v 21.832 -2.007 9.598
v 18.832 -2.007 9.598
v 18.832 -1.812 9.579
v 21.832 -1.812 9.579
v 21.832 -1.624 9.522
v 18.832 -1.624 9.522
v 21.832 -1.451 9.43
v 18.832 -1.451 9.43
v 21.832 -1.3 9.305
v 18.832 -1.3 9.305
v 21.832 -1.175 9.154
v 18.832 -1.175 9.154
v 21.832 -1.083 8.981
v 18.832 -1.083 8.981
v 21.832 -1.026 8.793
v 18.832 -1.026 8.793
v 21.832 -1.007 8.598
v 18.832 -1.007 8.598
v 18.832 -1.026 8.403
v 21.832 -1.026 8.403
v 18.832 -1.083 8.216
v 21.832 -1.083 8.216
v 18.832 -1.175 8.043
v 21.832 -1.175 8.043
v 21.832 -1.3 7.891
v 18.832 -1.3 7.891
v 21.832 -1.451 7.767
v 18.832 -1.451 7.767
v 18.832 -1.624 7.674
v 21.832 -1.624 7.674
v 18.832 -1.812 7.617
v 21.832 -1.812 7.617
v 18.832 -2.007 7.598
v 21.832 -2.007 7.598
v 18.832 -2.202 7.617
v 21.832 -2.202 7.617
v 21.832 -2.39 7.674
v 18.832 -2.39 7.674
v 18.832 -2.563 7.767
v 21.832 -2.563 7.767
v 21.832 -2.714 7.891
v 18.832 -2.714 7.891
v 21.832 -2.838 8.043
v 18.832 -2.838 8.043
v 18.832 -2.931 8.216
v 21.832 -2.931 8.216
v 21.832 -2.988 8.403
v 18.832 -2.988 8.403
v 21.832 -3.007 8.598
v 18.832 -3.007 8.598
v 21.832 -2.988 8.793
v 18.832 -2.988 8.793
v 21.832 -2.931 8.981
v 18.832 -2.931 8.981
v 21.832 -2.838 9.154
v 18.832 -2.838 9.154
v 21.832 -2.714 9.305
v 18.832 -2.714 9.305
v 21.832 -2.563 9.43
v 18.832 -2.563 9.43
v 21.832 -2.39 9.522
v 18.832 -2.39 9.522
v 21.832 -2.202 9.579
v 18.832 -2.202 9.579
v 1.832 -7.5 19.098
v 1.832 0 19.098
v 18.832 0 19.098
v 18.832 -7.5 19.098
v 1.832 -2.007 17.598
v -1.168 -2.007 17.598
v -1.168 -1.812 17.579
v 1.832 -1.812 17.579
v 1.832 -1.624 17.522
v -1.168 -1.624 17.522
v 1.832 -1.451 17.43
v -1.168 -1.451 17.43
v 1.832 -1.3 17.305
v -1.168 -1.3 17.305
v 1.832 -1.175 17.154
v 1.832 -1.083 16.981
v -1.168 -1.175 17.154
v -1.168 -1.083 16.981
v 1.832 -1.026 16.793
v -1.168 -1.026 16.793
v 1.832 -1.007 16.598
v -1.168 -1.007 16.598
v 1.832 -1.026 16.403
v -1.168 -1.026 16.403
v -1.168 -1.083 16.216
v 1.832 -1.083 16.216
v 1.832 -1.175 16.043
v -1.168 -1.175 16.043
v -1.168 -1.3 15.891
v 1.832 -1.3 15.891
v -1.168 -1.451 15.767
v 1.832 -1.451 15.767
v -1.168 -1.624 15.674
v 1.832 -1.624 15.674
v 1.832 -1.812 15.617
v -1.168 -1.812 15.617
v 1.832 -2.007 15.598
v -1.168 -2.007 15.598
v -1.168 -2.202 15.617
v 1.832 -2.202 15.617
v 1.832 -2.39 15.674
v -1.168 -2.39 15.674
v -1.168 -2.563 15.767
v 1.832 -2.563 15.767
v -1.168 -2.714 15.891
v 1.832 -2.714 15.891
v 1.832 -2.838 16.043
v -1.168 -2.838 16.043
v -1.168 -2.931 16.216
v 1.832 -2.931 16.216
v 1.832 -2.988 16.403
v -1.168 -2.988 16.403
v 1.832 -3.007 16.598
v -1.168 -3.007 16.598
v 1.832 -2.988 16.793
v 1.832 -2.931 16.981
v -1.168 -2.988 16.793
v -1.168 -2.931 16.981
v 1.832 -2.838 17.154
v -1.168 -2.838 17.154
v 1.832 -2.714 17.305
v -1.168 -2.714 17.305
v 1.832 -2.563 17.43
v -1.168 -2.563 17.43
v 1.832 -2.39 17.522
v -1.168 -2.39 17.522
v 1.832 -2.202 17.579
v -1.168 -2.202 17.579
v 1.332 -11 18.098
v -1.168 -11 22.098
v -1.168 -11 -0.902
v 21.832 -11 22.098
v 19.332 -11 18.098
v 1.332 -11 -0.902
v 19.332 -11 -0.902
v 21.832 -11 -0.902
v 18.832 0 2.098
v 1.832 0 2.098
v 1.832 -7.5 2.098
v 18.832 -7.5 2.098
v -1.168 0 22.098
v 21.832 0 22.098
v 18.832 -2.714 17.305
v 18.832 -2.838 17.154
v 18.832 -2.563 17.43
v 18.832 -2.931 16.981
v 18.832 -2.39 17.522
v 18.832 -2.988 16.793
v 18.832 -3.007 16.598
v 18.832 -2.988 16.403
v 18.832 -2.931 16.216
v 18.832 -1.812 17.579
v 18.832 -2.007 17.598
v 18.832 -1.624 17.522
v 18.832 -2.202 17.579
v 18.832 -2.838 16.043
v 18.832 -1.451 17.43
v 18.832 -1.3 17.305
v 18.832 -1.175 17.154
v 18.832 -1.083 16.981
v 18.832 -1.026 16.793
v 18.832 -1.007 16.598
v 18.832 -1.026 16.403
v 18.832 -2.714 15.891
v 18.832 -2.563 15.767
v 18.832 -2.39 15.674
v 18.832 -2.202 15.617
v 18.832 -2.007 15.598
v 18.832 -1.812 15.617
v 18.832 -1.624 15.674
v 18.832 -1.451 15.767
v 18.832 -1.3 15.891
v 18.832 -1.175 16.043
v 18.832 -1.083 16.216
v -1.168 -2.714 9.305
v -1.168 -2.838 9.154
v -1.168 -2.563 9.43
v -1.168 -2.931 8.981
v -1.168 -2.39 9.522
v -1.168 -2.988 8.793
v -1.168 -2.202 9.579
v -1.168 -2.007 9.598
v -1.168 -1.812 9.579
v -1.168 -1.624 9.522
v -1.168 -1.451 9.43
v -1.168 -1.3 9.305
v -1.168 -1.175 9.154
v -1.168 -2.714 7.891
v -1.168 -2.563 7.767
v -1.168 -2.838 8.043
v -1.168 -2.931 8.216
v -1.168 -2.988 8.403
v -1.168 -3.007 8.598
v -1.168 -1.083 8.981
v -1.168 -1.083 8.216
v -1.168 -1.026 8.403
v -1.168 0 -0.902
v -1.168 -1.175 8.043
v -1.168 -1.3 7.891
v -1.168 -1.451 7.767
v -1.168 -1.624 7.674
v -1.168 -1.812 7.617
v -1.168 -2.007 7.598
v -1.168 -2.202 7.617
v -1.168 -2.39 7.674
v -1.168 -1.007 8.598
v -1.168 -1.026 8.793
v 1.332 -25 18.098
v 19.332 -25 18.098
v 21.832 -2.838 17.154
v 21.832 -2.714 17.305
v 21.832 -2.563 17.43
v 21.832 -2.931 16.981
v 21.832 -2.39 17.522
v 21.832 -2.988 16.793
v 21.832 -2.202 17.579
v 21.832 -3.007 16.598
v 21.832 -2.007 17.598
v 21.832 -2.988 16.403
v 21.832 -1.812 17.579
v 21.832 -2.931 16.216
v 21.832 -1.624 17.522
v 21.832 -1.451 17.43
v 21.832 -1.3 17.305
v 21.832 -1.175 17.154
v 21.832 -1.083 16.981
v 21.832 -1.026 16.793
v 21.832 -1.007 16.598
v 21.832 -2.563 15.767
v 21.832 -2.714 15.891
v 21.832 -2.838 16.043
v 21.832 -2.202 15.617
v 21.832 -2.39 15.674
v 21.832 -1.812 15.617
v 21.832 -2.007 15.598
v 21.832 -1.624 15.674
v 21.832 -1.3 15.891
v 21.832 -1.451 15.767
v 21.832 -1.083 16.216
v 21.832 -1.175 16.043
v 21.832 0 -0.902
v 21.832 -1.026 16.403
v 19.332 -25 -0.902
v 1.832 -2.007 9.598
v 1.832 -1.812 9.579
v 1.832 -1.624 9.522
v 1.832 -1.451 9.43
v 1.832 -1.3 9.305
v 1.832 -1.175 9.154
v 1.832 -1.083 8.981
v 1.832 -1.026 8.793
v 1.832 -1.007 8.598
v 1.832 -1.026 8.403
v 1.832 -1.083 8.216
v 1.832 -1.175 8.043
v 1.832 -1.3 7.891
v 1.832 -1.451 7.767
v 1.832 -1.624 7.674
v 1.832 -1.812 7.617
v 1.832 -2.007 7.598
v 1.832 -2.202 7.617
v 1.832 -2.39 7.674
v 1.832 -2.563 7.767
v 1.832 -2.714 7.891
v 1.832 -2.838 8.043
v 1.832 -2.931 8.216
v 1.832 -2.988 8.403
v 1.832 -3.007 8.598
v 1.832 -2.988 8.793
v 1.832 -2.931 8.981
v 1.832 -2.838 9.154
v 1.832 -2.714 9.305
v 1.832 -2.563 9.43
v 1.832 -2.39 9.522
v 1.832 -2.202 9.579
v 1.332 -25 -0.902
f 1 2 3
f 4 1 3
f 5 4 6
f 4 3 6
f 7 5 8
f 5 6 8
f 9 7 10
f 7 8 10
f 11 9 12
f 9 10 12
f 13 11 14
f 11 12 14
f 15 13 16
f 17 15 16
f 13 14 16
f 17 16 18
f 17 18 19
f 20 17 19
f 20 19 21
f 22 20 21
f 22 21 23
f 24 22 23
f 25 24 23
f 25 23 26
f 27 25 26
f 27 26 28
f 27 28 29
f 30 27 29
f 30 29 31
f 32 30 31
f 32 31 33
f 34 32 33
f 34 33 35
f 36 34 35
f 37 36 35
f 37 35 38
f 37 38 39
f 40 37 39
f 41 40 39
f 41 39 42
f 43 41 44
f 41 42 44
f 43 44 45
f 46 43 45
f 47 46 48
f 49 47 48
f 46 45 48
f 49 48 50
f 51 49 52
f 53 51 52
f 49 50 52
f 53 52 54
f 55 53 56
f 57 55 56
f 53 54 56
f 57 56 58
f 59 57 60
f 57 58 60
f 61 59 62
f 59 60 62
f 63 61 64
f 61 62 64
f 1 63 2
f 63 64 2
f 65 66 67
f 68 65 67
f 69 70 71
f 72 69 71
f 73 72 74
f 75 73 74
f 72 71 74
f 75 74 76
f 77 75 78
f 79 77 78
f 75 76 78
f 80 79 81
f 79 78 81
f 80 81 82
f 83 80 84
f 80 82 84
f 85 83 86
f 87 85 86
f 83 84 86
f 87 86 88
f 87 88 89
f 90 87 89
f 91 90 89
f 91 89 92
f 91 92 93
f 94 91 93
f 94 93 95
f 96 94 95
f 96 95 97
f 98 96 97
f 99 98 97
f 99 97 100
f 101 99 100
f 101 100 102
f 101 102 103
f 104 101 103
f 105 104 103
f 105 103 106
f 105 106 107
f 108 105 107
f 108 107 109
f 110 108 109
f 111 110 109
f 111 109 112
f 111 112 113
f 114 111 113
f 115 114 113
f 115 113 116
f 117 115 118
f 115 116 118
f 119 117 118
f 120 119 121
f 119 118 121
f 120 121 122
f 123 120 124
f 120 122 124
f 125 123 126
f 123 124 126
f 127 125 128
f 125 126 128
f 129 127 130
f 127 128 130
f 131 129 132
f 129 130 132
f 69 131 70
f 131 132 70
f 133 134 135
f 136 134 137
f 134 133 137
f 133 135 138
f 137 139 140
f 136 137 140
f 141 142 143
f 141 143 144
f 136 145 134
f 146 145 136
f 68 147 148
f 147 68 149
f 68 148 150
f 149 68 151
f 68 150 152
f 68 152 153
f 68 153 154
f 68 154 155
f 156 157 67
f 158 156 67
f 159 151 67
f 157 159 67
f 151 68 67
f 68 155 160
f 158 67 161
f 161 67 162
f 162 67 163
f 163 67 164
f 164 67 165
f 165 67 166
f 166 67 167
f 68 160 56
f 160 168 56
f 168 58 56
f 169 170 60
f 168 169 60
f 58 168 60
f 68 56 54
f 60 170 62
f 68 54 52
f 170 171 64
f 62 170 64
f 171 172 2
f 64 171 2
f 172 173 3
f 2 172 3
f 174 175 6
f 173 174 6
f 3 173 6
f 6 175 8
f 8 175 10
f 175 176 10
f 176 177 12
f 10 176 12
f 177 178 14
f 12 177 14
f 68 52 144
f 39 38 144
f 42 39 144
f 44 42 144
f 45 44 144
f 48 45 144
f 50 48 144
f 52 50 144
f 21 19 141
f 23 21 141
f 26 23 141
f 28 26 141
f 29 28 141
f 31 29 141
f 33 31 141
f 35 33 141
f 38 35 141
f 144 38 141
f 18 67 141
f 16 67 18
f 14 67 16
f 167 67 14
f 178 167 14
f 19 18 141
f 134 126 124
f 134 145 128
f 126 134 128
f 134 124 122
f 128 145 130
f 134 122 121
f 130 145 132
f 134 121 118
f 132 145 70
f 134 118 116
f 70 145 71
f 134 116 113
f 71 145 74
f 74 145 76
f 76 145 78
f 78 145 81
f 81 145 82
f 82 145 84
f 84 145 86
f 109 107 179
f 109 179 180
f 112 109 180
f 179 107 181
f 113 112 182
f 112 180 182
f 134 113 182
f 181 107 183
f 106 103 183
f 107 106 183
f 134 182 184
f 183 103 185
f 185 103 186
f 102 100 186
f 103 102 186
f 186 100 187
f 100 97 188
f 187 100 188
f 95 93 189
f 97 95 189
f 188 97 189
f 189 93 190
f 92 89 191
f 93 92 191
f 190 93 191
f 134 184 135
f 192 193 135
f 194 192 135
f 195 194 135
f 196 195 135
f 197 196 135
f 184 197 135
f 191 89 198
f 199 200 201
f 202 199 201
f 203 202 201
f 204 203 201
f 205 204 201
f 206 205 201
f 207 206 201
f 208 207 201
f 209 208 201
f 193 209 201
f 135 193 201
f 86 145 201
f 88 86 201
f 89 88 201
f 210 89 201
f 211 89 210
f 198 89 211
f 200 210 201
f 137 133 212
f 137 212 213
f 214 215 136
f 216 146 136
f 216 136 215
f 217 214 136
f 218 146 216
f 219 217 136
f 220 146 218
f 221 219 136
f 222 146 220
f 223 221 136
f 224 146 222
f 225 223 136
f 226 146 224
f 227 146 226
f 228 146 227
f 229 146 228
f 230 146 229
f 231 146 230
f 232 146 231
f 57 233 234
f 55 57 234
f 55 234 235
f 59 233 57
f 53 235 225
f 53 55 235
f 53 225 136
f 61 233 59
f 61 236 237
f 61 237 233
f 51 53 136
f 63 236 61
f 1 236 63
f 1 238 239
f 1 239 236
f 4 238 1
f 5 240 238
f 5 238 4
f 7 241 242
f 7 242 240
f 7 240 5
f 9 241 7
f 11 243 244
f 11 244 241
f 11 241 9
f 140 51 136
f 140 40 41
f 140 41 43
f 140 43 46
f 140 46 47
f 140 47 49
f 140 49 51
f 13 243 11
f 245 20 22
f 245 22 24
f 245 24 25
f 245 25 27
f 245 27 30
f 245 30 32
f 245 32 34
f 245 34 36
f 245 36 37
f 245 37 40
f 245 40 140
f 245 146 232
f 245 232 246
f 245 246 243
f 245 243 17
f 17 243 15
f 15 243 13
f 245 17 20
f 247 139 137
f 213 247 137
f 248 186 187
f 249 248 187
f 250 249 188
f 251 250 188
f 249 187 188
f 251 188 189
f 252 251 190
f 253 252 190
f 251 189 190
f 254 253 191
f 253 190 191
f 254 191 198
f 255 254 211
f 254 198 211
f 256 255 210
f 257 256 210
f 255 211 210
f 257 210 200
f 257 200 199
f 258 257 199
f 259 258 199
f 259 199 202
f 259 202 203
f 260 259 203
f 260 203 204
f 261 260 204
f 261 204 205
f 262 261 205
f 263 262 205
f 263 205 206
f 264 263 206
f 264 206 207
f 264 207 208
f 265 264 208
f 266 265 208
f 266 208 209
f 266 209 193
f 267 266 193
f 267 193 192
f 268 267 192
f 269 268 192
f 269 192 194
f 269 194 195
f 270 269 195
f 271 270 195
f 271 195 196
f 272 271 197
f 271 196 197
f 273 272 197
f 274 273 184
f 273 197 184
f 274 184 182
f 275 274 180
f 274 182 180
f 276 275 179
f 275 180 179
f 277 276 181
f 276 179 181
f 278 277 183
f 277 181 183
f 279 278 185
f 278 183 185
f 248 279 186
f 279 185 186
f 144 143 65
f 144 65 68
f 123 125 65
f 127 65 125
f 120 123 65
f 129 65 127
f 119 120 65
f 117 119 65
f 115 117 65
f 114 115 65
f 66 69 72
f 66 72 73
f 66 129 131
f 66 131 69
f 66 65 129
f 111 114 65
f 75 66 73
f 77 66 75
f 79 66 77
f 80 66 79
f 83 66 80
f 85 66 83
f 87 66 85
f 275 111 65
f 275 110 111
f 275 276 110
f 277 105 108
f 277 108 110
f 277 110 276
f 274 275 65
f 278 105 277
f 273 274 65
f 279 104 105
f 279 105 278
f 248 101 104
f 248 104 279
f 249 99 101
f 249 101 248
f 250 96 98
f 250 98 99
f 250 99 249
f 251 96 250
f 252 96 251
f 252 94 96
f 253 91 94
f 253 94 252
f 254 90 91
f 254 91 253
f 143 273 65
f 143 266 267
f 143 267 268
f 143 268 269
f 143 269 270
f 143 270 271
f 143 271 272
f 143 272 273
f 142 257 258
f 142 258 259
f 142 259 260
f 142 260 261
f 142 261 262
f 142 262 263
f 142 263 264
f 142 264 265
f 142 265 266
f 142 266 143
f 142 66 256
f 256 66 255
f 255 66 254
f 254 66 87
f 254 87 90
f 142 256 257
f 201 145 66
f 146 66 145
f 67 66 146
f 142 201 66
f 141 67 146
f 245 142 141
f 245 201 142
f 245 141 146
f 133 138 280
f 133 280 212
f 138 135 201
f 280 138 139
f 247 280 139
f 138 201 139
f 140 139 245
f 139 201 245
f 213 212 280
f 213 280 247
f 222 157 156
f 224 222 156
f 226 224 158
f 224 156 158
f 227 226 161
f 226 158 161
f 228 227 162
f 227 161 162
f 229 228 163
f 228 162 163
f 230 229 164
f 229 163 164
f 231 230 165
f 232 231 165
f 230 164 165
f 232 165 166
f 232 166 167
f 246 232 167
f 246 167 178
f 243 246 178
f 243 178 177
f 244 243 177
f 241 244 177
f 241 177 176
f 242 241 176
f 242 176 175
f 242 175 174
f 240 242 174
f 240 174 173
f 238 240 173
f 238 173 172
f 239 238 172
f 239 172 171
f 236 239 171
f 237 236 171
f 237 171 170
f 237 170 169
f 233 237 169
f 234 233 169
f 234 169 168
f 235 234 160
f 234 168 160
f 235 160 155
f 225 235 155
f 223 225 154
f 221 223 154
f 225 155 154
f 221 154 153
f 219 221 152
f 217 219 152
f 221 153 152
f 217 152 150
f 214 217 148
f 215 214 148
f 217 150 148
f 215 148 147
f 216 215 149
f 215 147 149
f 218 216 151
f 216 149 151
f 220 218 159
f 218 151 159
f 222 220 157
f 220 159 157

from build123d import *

# Parameters (mm, degrees)
SKETCH1_W           = 23
SKETCH1_H           = 23
BOSS_EXTRUDE1_DEPTH = 11
SKETCH2_W           = 17
SKETCH2_H           = 17
CUT_EXTRUDE1_DEPTH  = 7.5
SKETCH3_W           = 18
SKETCH3_H           = 19
BOSS_EXTRUDE2_DEPTH = 14
SKETCH4_R           = 1
CUT_EXTRUDE2_DEPTH  = 23


with BuildPart() as part:
    # Sketch1 → Boss-Extrude1 (new body)
    with BuildSketch(Plane(origin=(0, 0, 0), x_dir=(1, 0, 0), z_dir=(0, 1, 0))):
        with Locations((10.331746032, -10.598253968)):
            Rectangle(SKETCH1_W, SKETCH1_H)
    extrude(amount=-BOSS_EXTRUDE1_DEPTH)

    # Sketch2 → Cut-Extrude1 (cut)
    with BuildSketch(Plane(origin=(0, 0, 0), x_dir=(1, 0, 0), z_dir=(0, 1, 0))):
        with Locations((10.331746032, -10.598253968)):
            Rectangle(SKETCH2_W, SKETCH2_H)
    extrude(amount=-CUT_EXTRUDE1_DEPTH, mode=Mode.SUBTRACT)

    # Sketch3 → Boss-Extrude2 (add)
    with BuildSketch(Plane.XZ.offset(11)):
        with Locations((10.331746032, 8.598253968)):
            Rectangle(SKETCH3_W, SKETCH3_H)
    extrude(amount=BOSS_EXTRUDE2_DEPTH)

    # Sketch4 → Cut-Extrude2 (cut)
    with BuildSketch(Plane.ZY.offset(1.168253968)):
        with Locations((8.598253968, -2.006935825)):
            Circle(SKETCH4_R)
        with Locations((16.598253968, -2.006935825)):
            Circle(SKETCH4_R)
    extrude(amount=-CUT_EXTRUDE2_DEPTH, mode=Mode.SUBTRACT)


solid = part.part
